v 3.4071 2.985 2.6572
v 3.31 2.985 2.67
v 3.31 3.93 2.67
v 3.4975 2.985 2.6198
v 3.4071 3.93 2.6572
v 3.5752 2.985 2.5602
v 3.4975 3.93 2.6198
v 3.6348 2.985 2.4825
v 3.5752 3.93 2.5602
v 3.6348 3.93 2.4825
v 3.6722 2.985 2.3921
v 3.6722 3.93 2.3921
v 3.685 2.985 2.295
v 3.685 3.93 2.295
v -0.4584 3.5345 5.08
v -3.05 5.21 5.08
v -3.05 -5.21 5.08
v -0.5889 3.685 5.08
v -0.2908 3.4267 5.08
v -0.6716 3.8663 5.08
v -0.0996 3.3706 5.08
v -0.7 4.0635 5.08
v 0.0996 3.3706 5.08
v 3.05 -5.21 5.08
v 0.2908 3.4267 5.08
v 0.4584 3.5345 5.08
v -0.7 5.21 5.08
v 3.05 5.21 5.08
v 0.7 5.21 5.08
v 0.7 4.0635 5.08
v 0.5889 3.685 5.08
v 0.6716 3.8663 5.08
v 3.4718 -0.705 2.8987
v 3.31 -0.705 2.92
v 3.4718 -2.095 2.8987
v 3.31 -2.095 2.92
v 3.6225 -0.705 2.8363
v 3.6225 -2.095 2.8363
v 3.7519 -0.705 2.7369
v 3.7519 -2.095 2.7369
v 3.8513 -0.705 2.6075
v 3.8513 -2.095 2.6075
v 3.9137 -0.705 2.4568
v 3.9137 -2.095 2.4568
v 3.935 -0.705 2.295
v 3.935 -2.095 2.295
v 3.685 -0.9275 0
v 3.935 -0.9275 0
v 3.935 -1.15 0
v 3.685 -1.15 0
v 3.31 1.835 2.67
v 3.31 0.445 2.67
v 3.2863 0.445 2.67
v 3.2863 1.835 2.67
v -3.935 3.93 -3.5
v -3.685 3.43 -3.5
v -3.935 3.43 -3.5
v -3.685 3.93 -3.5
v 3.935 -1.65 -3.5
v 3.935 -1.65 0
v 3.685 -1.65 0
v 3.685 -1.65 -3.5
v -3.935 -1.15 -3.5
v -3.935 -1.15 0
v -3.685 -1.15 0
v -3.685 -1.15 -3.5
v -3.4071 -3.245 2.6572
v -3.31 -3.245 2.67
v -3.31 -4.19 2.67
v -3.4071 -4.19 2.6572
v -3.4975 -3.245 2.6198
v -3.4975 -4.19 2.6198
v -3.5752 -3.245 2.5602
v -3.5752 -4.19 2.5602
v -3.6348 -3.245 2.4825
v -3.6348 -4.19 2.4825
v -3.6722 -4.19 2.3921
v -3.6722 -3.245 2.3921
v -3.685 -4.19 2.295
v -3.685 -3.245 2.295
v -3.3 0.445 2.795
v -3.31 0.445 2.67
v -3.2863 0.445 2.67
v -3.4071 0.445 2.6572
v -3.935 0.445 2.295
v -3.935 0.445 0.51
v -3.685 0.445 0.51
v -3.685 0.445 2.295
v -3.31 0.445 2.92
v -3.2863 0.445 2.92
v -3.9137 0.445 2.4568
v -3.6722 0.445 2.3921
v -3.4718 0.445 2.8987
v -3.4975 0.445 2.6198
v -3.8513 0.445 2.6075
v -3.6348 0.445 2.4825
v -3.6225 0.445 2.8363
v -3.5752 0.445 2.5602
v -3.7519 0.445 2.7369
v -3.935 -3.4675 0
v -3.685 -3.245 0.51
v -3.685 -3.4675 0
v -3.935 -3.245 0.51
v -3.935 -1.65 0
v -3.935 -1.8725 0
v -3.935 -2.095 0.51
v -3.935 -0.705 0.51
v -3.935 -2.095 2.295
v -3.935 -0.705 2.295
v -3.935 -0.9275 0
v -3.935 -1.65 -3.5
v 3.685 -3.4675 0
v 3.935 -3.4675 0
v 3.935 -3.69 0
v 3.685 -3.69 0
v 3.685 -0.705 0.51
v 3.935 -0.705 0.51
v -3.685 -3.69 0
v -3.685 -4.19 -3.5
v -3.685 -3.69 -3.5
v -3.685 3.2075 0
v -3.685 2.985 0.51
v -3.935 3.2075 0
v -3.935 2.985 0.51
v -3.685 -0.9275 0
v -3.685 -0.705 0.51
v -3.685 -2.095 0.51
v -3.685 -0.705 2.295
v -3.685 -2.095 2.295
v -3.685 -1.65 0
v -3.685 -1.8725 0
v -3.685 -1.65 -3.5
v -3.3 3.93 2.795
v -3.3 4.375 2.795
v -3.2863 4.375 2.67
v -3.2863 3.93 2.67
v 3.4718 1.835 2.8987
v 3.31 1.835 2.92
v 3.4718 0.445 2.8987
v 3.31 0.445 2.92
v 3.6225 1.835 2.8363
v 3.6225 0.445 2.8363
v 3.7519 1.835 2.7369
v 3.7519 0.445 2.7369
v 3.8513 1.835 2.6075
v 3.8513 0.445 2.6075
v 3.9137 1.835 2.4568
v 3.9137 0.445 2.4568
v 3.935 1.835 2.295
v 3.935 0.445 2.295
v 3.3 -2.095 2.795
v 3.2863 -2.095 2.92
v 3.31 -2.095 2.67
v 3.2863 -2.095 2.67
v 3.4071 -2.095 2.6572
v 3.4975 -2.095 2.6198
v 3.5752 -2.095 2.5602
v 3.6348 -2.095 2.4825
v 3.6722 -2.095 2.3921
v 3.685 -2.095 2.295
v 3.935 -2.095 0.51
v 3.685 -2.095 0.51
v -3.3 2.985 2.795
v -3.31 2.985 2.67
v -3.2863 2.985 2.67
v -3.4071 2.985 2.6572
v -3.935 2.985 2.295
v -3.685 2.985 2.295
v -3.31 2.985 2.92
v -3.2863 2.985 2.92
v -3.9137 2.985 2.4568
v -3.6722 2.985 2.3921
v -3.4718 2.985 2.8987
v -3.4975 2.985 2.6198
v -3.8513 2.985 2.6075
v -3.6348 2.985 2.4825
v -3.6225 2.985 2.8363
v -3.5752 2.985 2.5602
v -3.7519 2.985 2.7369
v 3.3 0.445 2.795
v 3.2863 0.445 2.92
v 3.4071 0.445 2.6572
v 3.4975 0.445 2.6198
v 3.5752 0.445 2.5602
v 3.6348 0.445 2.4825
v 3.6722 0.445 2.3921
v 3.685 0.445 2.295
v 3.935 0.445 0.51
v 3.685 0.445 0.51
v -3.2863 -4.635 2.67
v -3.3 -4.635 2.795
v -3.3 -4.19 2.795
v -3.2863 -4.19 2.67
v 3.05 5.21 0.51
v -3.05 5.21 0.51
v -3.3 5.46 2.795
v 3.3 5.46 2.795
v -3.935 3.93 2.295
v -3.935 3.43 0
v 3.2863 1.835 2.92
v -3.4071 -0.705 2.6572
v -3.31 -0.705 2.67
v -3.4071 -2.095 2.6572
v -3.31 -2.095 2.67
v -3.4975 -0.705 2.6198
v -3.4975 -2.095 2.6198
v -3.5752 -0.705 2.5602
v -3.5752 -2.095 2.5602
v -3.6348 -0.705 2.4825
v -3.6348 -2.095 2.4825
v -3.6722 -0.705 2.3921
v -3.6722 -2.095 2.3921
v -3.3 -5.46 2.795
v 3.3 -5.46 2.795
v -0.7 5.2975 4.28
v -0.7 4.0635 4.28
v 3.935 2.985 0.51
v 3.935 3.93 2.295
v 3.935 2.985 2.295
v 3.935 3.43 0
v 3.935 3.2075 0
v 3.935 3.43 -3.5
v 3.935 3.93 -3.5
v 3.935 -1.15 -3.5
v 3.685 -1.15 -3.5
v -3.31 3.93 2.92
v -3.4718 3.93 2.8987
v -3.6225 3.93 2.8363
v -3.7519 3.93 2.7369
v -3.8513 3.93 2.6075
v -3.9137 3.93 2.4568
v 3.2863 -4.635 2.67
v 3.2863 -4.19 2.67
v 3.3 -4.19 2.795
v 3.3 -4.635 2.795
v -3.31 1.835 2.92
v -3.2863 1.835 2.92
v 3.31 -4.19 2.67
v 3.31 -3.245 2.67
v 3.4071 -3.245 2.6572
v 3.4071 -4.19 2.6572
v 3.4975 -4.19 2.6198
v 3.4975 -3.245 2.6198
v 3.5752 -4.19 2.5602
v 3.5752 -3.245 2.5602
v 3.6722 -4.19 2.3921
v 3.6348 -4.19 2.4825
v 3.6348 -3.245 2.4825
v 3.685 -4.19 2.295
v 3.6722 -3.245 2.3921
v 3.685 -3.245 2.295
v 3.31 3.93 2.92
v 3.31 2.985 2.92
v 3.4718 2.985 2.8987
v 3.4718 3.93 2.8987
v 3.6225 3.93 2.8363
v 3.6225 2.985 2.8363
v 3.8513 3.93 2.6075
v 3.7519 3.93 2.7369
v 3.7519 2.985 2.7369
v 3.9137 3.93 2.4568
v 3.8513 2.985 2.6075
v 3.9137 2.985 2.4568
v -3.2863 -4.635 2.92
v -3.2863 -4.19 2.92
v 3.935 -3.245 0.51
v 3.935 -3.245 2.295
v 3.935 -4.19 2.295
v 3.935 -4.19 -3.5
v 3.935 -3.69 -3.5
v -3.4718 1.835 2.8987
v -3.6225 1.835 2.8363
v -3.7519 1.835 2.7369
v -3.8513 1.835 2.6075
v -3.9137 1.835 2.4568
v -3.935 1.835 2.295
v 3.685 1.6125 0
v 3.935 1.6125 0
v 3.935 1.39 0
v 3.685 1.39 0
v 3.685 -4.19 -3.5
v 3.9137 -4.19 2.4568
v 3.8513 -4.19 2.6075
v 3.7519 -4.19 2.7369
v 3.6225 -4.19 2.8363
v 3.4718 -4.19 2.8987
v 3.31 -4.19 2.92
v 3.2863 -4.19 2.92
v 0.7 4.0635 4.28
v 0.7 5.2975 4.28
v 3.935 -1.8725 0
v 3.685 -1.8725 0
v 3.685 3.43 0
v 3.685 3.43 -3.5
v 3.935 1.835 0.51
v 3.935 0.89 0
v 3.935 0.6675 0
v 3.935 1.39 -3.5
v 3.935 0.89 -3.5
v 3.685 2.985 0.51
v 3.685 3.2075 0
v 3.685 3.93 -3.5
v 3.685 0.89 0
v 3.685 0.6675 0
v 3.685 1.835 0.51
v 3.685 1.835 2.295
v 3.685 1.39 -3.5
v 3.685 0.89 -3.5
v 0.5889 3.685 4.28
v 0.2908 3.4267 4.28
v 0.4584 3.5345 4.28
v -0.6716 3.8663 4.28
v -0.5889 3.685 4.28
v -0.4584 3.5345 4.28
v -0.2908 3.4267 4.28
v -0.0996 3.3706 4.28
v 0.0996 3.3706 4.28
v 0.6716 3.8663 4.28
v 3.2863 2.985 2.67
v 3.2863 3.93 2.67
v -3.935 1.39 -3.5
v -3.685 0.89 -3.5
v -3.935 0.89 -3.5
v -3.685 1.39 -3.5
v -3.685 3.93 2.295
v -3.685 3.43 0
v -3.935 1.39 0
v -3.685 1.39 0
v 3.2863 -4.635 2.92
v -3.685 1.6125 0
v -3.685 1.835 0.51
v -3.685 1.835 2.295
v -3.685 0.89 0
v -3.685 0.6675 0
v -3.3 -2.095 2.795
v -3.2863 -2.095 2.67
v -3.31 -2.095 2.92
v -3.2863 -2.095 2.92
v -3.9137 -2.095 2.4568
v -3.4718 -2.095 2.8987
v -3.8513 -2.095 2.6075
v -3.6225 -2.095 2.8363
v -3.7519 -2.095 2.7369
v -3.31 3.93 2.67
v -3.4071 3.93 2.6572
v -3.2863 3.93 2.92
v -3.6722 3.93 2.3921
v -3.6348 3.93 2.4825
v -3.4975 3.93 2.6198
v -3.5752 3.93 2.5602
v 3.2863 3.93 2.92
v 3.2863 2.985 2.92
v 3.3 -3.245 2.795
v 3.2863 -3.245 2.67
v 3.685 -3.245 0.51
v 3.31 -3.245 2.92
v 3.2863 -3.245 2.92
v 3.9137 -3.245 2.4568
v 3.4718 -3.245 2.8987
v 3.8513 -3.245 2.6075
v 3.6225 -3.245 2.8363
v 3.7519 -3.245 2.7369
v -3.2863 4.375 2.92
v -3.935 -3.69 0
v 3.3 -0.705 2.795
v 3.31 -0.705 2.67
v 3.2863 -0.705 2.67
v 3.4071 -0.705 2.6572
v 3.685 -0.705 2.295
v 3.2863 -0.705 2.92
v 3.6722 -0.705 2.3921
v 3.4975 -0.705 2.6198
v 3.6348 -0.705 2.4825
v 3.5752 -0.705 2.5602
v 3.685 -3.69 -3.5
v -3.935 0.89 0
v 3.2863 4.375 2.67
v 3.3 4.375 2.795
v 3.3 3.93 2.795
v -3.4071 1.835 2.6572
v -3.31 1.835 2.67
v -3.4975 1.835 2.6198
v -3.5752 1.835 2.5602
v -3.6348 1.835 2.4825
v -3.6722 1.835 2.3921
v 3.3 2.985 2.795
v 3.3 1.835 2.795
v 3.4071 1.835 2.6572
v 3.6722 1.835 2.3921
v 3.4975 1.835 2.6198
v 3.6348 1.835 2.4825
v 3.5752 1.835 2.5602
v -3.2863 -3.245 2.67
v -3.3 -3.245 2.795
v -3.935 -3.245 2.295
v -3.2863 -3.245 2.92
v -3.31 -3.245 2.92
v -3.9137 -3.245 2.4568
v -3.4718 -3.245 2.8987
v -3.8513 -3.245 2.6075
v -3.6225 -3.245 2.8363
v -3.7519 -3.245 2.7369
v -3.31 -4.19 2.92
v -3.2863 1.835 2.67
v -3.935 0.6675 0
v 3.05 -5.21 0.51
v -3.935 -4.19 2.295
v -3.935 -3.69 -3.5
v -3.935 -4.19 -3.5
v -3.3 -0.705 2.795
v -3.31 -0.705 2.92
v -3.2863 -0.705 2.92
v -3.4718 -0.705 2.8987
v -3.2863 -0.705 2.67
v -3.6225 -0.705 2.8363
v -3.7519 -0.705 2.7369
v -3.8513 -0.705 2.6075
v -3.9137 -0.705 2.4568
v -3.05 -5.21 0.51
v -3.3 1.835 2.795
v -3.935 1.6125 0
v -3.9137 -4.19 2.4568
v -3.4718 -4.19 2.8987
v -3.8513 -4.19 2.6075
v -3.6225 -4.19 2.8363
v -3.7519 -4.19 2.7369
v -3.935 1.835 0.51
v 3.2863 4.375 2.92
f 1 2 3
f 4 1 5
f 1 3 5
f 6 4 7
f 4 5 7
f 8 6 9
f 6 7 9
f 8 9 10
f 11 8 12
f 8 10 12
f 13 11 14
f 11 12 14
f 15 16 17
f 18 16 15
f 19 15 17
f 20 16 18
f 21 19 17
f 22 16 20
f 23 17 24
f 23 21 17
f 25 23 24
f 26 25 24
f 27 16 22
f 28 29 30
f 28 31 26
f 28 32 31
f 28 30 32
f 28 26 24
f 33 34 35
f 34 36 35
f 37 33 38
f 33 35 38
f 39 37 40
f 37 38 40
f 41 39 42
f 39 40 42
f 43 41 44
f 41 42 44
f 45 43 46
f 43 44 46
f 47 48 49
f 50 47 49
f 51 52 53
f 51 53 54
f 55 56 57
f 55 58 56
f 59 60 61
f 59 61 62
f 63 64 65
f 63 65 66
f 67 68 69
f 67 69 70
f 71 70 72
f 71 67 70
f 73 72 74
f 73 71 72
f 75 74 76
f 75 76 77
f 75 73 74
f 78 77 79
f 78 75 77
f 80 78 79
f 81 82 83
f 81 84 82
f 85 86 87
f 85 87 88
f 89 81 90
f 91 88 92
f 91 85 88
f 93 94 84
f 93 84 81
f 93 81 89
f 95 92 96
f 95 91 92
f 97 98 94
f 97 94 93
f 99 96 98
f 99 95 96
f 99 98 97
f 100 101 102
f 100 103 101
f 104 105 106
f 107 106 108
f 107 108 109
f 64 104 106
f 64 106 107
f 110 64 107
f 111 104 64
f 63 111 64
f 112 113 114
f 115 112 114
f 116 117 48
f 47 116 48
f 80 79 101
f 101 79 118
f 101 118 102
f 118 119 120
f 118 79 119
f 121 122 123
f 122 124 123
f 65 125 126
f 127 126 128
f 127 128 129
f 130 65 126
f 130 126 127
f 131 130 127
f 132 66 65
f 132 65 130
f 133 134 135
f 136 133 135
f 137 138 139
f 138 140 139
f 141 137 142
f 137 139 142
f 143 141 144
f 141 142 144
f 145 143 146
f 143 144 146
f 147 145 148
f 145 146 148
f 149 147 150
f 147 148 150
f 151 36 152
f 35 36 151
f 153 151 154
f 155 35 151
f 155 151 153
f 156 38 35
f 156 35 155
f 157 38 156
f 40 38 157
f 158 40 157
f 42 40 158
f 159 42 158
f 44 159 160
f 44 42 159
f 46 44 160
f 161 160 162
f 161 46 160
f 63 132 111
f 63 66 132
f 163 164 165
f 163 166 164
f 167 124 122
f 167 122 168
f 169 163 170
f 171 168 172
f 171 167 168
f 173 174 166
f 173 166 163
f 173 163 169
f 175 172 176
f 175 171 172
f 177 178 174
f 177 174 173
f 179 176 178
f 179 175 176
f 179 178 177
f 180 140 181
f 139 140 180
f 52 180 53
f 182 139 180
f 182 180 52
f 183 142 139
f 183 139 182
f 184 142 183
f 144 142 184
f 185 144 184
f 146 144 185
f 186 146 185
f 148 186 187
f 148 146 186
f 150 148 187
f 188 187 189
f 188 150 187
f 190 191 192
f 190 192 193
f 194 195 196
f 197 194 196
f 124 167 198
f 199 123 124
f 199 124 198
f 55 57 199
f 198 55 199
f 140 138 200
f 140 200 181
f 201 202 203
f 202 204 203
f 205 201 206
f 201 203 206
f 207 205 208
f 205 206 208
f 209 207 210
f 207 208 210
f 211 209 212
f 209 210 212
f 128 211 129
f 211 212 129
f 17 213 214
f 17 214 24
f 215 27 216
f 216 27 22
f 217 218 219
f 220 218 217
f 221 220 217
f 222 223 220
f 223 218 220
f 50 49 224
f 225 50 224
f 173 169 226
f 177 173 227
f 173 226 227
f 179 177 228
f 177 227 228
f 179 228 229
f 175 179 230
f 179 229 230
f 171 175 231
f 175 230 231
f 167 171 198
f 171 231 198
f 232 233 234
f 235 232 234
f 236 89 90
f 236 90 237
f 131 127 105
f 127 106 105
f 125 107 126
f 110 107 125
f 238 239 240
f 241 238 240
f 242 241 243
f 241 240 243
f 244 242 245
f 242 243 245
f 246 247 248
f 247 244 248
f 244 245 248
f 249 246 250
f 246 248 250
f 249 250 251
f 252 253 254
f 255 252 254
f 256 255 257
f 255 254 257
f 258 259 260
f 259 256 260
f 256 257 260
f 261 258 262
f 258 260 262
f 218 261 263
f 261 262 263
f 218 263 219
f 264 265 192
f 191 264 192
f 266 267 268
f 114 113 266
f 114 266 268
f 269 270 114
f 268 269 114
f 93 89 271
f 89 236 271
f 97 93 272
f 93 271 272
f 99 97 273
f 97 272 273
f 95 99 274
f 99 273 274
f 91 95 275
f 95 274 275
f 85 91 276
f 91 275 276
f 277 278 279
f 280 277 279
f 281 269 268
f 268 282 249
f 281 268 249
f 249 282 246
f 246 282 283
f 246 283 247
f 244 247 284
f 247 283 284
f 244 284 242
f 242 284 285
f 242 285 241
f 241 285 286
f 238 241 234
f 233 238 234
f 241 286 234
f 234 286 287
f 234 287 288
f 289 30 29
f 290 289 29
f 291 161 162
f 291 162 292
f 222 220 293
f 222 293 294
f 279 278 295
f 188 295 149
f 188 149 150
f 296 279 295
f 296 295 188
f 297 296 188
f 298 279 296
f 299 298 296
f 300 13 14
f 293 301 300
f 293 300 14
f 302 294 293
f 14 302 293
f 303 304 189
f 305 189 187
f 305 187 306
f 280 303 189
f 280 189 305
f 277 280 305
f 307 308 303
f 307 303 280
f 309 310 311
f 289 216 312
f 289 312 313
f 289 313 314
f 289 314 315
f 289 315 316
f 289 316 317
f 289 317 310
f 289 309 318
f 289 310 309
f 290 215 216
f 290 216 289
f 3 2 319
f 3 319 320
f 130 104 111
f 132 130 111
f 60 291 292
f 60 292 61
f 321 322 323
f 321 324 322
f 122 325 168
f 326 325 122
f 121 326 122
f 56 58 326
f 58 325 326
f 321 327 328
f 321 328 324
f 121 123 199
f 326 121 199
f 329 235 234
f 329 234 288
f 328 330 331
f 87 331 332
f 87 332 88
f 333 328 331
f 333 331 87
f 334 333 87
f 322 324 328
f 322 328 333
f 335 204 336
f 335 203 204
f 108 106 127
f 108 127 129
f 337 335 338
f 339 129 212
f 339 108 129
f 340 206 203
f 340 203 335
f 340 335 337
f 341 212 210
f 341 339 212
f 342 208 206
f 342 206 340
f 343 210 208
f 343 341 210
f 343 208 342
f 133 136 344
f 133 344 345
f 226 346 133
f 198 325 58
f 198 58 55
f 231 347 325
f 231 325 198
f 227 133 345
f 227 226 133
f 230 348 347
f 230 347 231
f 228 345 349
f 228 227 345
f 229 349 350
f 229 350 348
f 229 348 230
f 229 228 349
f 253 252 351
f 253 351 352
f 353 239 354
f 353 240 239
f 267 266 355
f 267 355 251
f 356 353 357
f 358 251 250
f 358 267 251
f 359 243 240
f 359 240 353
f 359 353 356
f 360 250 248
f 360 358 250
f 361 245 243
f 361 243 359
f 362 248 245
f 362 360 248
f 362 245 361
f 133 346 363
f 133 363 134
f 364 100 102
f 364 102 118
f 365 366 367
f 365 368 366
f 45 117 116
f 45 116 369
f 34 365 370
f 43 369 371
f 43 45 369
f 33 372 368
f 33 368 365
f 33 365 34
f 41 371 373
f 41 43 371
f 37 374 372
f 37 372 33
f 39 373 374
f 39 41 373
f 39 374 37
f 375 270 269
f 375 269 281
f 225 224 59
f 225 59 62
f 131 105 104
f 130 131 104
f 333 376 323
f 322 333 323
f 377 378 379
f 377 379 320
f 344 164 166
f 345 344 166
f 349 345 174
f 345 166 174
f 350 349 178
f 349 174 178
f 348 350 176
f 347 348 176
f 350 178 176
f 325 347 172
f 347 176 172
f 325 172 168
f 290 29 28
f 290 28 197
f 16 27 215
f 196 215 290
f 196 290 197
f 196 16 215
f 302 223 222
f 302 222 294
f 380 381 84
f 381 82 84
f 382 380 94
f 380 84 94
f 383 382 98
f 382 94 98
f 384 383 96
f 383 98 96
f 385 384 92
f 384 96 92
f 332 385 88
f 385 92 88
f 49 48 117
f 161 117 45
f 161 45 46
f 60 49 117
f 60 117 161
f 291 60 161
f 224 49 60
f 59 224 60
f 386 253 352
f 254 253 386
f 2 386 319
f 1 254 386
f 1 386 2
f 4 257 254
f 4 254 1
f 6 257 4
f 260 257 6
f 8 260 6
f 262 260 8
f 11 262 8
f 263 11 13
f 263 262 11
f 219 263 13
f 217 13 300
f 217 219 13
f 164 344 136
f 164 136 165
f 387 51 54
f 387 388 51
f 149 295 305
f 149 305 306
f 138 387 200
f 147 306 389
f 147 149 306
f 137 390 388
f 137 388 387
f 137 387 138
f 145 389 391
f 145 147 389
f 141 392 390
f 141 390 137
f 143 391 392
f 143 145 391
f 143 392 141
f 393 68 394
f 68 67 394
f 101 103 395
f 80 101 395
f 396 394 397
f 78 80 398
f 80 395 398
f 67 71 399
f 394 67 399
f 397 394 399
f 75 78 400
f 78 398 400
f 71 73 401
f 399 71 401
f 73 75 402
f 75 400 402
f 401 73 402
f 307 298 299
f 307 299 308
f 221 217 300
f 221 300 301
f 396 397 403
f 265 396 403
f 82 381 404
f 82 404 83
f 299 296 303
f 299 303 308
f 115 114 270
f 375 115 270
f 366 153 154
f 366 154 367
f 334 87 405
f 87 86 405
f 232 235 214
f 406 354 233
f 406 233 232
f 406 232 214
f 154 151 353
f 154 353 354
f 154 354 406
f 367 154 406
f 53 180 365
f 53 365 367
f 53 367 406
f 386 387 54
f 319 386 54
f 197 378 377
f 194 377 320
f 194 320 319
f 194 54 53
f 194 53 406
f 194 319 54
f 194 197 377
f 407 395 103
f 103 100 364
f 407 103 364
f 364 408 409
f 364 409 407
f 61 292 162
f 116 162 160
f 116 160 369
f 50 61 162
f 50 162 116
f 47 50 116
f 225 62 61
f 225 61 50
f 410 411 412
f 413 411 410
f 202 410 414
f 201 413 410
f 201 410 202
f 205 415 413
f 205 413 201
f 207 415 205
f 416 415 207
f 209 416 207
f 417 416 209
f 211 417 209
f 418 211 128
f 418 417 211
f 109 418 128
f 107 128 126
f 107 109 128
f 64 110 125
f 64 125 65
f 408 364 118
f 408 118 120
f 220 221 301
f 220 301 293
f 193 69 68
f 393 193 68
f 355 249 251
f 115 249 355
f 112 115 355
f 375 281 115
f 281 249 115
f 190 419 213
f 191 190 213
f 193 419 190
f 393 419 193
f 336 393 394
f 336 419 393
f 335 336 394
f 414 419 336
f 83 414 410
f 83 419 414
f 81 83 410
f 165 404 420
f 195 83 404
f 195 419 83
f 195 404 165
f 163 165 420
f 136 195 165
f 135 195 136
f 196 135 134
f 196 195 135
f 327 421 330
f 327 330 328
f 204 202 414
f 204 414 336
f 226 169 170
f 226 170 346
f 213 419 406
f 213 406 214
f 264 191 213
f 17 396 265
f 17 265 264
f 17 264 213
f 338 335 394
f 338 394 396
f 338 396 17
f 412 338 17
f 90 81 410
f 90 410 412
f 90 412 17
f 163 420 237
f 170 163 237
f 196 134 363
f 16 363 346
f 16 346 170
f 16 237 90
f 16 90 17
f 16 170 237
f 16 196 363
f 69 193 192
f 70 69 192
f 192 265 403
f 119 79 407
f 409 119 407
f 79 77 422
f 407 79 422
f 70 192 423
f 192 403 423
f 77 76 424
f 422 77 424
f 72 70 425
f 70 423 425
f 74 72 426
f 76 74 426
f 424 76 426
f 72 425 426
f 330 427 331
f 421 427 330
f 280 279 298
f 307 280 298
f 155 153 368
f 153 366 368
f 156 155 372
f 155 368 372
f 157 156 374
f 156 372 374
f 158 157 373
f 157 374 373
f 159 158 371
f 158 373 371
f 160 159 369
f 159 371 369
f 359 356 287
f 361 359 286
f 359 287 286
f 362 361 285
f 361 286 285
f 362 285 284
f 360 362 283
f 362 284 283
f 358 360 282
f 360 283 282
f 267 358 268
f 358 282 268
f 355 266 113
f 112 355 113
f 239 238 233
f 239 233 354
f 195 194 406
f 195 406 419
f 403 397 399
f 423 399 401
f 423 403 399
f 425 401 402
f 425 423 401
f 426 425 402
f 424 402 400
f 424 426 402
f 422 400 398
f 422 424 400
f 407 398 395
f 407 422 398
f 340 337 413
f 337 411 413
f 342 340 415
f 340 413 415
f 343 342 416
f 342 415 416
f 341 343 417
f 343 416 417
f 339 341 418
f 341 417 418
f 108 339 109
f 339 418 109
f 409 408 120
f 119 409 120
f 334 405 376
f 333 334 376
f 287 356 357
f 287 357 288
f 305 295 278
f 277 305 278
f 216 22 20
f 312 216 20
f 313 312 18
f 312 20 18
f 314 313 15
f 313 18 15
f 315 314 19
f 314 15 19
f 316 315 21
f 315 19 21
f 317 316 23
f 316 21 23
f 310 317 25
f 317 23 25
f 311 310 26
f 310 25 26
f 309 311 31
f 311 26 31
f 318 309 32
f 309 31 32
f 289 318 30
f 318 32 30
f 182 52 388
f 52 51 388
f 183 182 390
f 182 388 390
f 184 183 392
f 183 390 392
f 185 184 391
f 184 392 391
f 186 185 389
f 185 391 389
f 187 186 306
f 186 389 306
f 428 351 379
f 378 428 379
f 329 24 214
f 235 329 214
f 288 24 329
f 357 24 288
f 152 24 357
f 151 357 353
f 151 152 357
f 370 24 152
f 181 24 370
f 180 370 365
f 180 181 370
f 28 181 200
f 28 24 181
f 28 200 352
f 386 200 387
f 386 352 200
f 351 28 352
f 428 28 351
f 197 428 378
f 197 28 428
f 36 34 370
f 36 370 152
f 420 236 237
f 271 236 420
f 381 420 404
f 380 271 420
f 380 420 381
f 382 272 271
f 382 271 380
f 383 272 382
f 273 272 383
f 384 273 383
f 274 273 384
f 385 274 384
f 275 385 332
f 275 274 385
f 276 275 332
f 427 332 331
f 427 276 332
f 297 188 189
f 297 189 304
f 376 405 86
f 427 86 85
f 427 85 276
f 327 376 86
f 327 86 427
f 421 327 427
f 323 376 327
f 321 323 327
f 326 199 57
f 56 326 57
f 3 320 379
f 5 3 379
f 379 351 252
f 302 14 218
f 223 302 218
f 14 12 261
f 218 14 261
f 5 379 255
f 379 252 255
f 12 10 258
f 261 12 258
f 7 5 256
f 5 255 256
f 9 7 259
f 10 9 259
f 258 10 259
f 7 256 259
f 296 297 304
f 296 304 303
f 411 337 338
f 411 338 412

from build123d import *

# Parameters (mm, degrees)
BASIC_SHAPE_DEPTH              = 5.46
SIDE_PROFILE1_DEPTH            = 9.155243712
SIDE_PROFILE1_DEPTH_BACK       = 9.155243712
SIDE_PROFILE2_DEPTH            = 9.155243712
SIDE_PROFILE2_DEPTH_BACK       = 9.155243712
LOCATION_MARK_DEPTH            = 0.8
SKETCH6_W                      = 0.25
SKETCH6_H                      = 1.39
PIN_RELIEF_DEPTH               = 11.390535357
REMAINING_PINS_COUNT           = 4
REMAINING_PINS_PITCH           = 2.54
REMAINING_PINS_COPY_1_SKETCH_W = 0.25
REMAINING_PINS_COPY_1_SKETCH_H = 1.39
REMAINING_PINS_COPY_2_SKETCH_W = 0.25
REMAINING_PINS_COPY_2_SKETCH_H = 1.39
REMAINING_PINS_COPY_3_SKETCH_W = 0.25
REMAINING_PINS_COPY_3_SKETCH_H = 1.39
REMAINING_PINS_COPY_4_DEPTH    = 11.390535357
REMAINING_PINS_COPY_5_DEPTH    = 11.390535357
REMAINING_PINS_COPY_6_DEPTH    = 11.390535357
PIN_SHAPE1_DEPTH               = 0.445
PIN_SHAPE2_DEPTH               = 0.445


with BuildPart() as part:
    # Sketch1 → Basic Shape (new, symmetric)
    with BuildSketch(Plane(origin=(0, 0, 0), x_dir=(1, 0, 0), z_dir=(0, 1, 0))):
        Polygon((-3.05, -0.51), (-3.3, -2.795), (-3.05, -5.08), (3.05, -5.08), (3.3, -2.795), (3.05, -0.51), align=None)
    extrude(amount=BASIC_SHAPE_DEPTH, both=True)

    # Sketch2 → Side Profile1 (cut, two sides: drawn at the far end of the back side and taken through both)
    with BuildSketch(Plane(origin=(0, 0, 0), x_dir=(0, 0, -1), z_dir=(1, 0, 0)).offset(-SIDE_PROFILE1_DEPTH_BACK)):
        Polygon((-5.08, 5.46), (-5.08, 5.21), (-2.795, 5.46), align=None)
        Polygon((-5.08, -5.46), (-2.795, -5.46), (-5.08, -5.21), align=None)
    extrude(amount=SIDE_PROFILE1_DEPTH + SIDE_PROFILE1_DEPTH_BACK, mode=Mode.SUBTRACT)

    # Sketch3 → Side Profile2 (cut, two sides: drawn at the far end of the back side and taken through both)
    with BuildSketch(Plane(origin=(0, 0, 0), x_dir=(0, 0, -1), z_dir=(1, 0, 0)).offset(-SIDE_PROFILE2_DEPTH_BACK)):
        Polygon((-2.795, 5.46), (-0.51, 5.46), (-0.51, 5.21), align=None)
        Polygon((-2.795, -5.46), (-0.51, -5.46), (-0.51, -5.21), align=None)
    extrude(amount=SIDE_PROFILE2_DEPTH + SIDE_PROFILE2_DEPTH_BACK, mode=Mode.SUBTRACT)

    # Sketch4 → Location Mark (cut)
    with BuildSketch(Plane(origin=(0, 0, 5.08), x_dir=(-1, 0, 0), z_dir=(0, 0, -1))):
        with BuildLine():
            Line((0.7, 5.563480235), (0.7, 4.063480235))
            ThreePointArc((0.7, 4.063480235), (0, 3.363480235), (-0.7, 4.063480235))
            Line((-0.7, 4.063480235), (-0.7, 5.563480235))
            Line((-0.7, 5.563480235), (0.7, 5.563480235))
        make_face()
    extrude(amount=LOCATION_MARK_DEPTH, mode=Mode.SUBTRACT)

    # First Pin: sweep along a path in Sketch5
    with BuildLine(Plane(origin=(0, -3.94, 0), x_dir=(1, 0, 0), z_dir=(0, 1, 0))) as first_pin_path:
        Line((0, -2.795), (3.31, -2.795))
        ThreePointArc((3.31, -2.795), (3.663553391, -2.648553391), (3.81, -2.295))
        Line((3.81, -2.295), (3.81, 3.5))
    # Sketch6 → First Pin (sweep)
    with BuildSketch(Plane(origin=(0, 0, 0), x_dir=(0, 0, -1), z_dir=(1, 0, 0))):
        with Locations((-2.795, -3.94)):
            Rectangle(SKETCH6_W, SKETCH6_H)
    first_pin = sweep(path=first_pin_path.line)

    # Sketch7 → Pin Relief (cut, through all)
    with BuildSketch(Plane(origin=(3.935, 0, 0), x_dir=(0, 0, -1), z_dir=(1, 0, 0))):
        Polygon((0, -4.19), (3.5, -4.19), (3.5, -4.635), (-0.51, -4.635), (0, -4.4125), align=None)
        Polygon((0, -3.69), (3.5, -3.69), (3.5, -3.245), (-0.51, -3.245), (0, -3.4675), align=None)
    pin_relief = extrude(amount=-PIN_RELIEF_DEPTH, mode=Mode.SUBTRACT)

    # Opp Pin: First Pin, Pin Relief across plane
    add(first_pin.mirror(Plane(origin=(0, 0, 0), x_dir=(0, 0, 1), z_dir=(1, 0, 0))))
    add(pin_relief.mirror(Plane(origin=(0, 0, 0), x_dir=(0, 0, 1), z_dir=(1, 0, 0))), mode=Mode.SUBTRACT)

    # Remaining Pins: First Pin, Pin Relief ×4
    with Locations(*[(0, i * REMAINING_PINS_PITCH, 0) for i in range(1, REMAINING_PINS_COUNT)]):
        add(first_pin)
        add(pin_relief, mode=Mode.SUBTRACT)

    # Remaining Pins copy 1: sweep along a path in Remaining Pins copy 1 path
    with BuildLine(Plane(origin=(0, -1.4, 0), x_dir=(-1, 0, 0), z_dir=(0, 1, 0))) as remaining_pins_copy_1_path:
        Line((0, 2.795), (3.31, 2.795))
        ThreePointArc((3.31, 2.795), (3.663553391, 2.648553391), (3.81, 2.295))
        Line((3.81, 2.295), (3.81, -3.5))
    # Remaining Pins copy 1 sketch → Remaining Pins copy 1 (sweep)
    with BuildSketch(Plane(origin=(0, 2.54, 0), x_dir=(0, 0, -1), z_dir=(-1, 0, 0))):
        with Locations((-2.795, 3.94)):
            Rectangle(REMAINING_PINS_COPY_1_SKETCH_W, REMAINING_PINS_COPY_1_SKETCH_H)
    sweep(path=remaining_pins_copy_1_path.line)

    # Remaining Pins copy 2: sweep along a path in Remaining Pins copy 2 path
    with BuildLine(Plane(origin=(0, 1.14, 0), x_dir=(-1, 0, 0), z_dir=(0, 1, 0))) as remaining_pins_copy_2_path:
        Line((0, 2.795), (3.31, 2.795))
        ThreePointArc((3.31, 2.795), (3.663553391, 2.648553391), (3.81, 2.295))
        Line((3.81, 2.295), (3.81, -3.5))
    # Remaining Pins copy 2 sketch → Remaining Pins copy 2 (sweep)
    with BuildSketch(Plane(origin=(0, 5.08, 0), x_dir=(0, 0, -1), z_dir=(-1, 0, 0))):
        with Locations((-2.795, 3.94)):
            Rectangle(REMAINING_PINS_COPY_2_SKETCH_W, REMAINING_PINS_COPY_2_SKETCH_H)
    sweep(path=remaining_pins_copy_2_path.line)

    # Remaining Pins copy 3: sweep along a path in Remaining Pins copy 3 path
    with BuildLine(Plane(origin=(0, 3.68, 0), x_dir=(-1, 0, 0), z_dir=(0, 1, 0))) as remaining_pins_copy_3_path:
        Line((0, 2.795), (3.31, 2.795))
        ThreePointArc((3.31, 2.795), (3.663553391, 2.648553391), (3.81, 2.295))
        Line((3.81, 2.295), (3.81, -3.5))
    # Remaining Pins copy 3 sketch → Remaining Pins copy 3 (sweep)
    with BuildSketch(Plane(origin=(0, 7.62, 0), x_dir=(0, 0, -1), z_dir=(-1, 0, 0))):
        with Locations((-2.795, 3.94)):
            Rectangle(REMAINING_PINS_COPY_3_SKETCH_W, REMAINING_PINS_COPY_3_SKETCH_H)
    sweep(path=remaining_pins_copy_3_path.line)

    # Remaining Pins copy 4 sketch → Remaining Pins copy 4 (cut, through all)
    with BuildSketch(Plane(origin=(-3.935, 2.54, 0), x_dir=(0, 0, -1), z_dir=(-1, 0, 0))):
        Polygon((0, 4.19), (3.5, 4.19), (3.5, 4.635), (-0.51, 4.635), (0, 4.4125), align=None)
        Polygon((0, 3.69), (3.5, 3.69), (3.5, 3.245), (-0.51, 3.245), (0, 3.4675), align=None)
    extrude(amount=-REMAINING_PINS_COPY_4_DEPTH, mode=Mode.SUBTRACT)

    # Remaining Pins copy 5 sketch → Remaining Pins copy 5 (cut, through all)
    with BuildSketch(Plane(origin=(-3.935, 5.08, 0), x_dir=(0, 0, -1), z_dir=(-1, 0, 0))):
        Polygon((0, 4.19), (3.5, 4.19), (3.5, 4.635), (-0.51, 4.635), (0, 4.4125), align=None)
        Polygon((0, 3.69), (3.5, 3.69), (3.5, 3.245), (-0.51, 3.245), (0, 3.4675), align=None)
    extrude(amount=-REMAINING_PINS_COPY_5_DEPTH, mode=Mode.SUBTRACT)

    # Remaining Pins copy 6 sketch → Remaining Pins copy 6 (cut, through all)
    with BuildSketch(Plane(origin=(-3.935, 7.62, 0), x_dir=(0, 0, -1), z_dir=(-1, 0, 0))):
        Polygon((0, 4.19), (3.5, 4.19), (3.5, 4.635), (-0.51, 4.635), (0, 4.4125), align=None)
        Polygon((0, 3.69), (3.5, 3.69), (3.5, 3.245), (-0.51, 3.245), (0, 3.4675), align=None)
    extrude(amount=-REMAINING_PINS_COPY_6_DEPTH, mode=Mode.SUBTRACT)

    # Sketch9 → Pin Shape1 (cut)
    with BuildSketch(Plane.XZ.offset(4.635)):
        with BuildLine():
            Line((3.935, 0), (3.685, 0))
            Line((3.685, 0), (3.685, 2.295))
            ThreePointArc((3.685, 2.295), (3.575165043, 2.560165043), (3.31, 2.67))
            Line((3.31, 2.67), (3.286323851, 2.67))
            Line((3.286323851, 2.67), (3.3, 2.795))
            Line((3.3, 2.795), (3.286323851, 2.92))
            Line((3.286323851, 2.92), (3.31, 2.92))
            ThreePointArc((3.31, 2.92), (3.751941738, 2.736941738), (3.935, 2.295))
            Line((3.935, 2.295), (3.935, 0))
        make_face()
        with BuildLine():
            Line((-3.685, 0), (-3.935, 0))
            Line((-3.935, 0), (-3.935, 2.295))
            ThreePointArc((-3.935, 2.295), (-3.751941738, 2.736941738), (-3.31, 2.92))
            Line((-3.31, 2.92), (-3.286323851, 2.92))
            Line((-3.286323851, 2.92), (-3.3, 2.795))
            Line((-3.3, 2.795), (-3.286323851, 2.67))
            Line((-3.286323851, 2.67), (-3.31, 2.67))
            ThreePointArc((-3.31, 2.67), (-3.575165043, 2.560165043), (-3.685, 2.295))
            Line((-3.685, 2.295), (-3.685, 0))
        make_face()
    extrude(amount=-PIN_SHAPE1_DEPTH, mode=Mode.SUBTRACT)

    # Sketch10 → Pin Shape2 (cut)
    with BuildSketch(Plane(origin=(0, 4.375, 0), x_dir=(-1, 0, 0), z_dir=(0, 1, 0))):
        with BuildLine():
            Line((3.685, 0), (3.935, 0))
            Line((3.935, 0), (3.935, 2.295))
            ThreePointArc((3.935, 2.295), (3.751941738, 2.736941738), (3.31, 2.92))
            Line((3.31, 2.92), (3.286323851, 2.92))
            Line((3.286323851, 2.92), (3.3, 2.795))
            Line((3.3, 2.795), (3.286323851, 2.67))
            Line((3.286323851, 2.67), (3.31, 2.67))
            ThreePointArc((3.31, 2.67), (3.575165043, 2.560165043), (3.685, 2.295))
            Line((3.685, 2.295), (3.685, 0))
        make_face()
        with BuildLine():
            Line((-3.685, 0), (-3.935, 0))
            Line((-3.935, 0), (-3.935, 2.295))
            ThreePointArc((-3.935, 2.295), (-3.751941738, 2.736941738), (-3.31, 2.92))
            Line((-3.31, 2.92), (-3.286323851, 2.92))
            Line((-3.286323851, 2.92), (-3.3, 2.795))
            Line((-3.3, 2.795), (-3.286323851, 2.67))
            Line((-3.286323851, 2.67), (-3.31, 2.67))
            ThreePointArc((-3.31, 2.67), (-3.575165043, 2.560165043), (-3.685, 2.295))
            Line((-3.685, 2.295), (-3.685, 0))
        make_face()
    extrude(amount=-PIN_SHAPE2_DEPTH, mode=Mode.SUBTRACT)


solid = part.part
